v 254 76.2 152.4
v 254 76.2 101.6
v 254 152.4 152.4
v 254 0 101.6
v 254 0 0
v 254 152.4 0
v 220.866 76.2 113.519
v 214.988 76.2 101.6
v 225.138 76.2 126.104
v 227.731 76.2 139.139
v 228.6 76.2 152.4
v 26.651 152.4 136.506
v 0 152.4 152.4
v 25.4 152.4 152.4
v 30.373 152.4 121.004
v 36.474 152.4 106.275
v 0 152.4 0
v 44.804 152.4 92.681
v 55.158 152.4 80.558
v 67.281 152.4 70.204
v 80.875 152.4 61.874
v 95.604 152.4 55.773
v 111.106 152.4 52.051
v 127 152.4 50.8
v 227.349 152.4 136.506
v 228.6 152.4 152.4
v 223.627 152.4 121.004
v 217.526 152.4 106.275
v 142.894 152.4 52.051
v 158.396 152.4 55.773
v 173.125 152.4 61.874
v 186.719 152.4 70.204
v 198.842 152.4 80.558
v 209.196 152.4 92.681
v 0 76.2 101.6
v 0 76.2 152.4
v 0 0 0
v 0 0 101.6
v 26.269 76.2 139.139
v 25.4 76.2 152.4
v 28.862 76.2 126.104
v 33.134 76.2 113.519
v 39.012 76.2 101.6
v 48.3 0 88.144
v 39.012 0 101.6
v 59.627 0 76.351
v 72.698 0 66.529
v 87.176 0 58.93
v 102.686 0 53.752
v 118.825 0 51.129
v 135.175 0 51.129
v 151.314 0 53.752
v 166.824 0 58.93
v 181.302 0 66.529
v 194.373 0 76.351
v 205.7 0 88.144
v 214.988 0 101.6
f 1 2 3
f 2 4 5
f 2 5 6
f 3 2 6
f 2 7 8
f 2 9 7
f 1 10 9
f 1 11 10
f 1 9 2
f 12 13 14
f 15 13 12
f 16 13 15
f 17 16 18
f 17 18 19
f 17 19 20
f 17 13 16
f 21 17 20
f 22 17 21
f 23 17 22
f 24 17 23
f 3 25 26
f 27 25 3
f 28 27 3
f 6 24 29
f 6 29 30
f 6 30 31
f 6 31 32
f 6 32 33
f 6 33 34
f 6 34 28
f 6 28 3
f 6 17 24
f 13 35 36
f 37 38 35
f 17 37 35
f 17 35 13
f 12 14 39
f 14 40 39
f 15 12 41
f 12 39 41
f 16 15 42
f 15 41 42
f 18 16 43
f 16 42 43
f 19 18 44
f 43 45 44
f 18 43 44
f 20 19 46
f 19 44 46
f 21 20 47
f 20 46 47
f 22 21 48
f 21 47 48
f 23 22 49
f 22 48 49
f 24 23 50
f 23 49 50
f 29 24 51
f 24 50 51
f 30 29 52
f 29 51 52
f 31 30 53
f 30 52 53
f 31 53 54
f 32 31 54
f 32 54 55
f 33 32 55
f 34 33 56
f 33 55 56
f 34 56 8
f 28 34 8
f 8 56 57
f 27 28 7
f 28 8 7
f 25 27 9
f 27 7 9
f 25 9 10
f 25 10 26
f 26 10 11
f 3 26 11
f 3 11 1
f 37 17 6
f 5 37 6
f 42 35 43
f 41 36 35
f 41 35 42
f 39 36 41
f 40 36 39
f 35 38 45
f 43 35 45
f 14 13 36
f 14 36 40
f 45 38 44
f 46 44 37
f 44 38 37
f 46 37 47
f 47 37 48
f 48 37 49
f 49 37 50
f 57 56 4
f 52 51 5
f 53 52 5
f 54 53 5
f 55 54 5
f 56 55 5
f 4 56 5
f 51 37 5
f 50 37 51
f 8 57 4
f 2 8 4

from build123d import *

# Parameters (mm, degrees)
F0_W     = 254
F0_H     = 152.4
F1_DEPTH = 152.4
F2_R     = 101.6
F3_DEPTH = 152.4
F4_W     = 254
F4_H     = 50.8
F5_DEPTH = 76.2


with BuildPart() as f1:
    # F0 (on Top) → F1 (new body)
    with BuildSketch(Plane.XY):
        with Locations((127, 76.2)):
            Rectangle(F0_W, F0_H)
    extrude(amount=F1_DEPTH)

    # F2 (on face) → F3 (cut)
    with BuildSketch(Plane.XZ):
        with Locations((127, 152.4)):
            Circle(F2_R)
    extrude(amount=-F3_DEPTH, mode=Mode.SUBTRACT)

    # F4 (on face) → F5 (cut)
    with BuildSketch(Plane.XZ):
        with Locations((127, 127)):
            Rectangle(F4_W, F4_H)
    extrude(amount=-F5_DEPTH, mode=Mode.SUBTRACT)


solid = f1.part
